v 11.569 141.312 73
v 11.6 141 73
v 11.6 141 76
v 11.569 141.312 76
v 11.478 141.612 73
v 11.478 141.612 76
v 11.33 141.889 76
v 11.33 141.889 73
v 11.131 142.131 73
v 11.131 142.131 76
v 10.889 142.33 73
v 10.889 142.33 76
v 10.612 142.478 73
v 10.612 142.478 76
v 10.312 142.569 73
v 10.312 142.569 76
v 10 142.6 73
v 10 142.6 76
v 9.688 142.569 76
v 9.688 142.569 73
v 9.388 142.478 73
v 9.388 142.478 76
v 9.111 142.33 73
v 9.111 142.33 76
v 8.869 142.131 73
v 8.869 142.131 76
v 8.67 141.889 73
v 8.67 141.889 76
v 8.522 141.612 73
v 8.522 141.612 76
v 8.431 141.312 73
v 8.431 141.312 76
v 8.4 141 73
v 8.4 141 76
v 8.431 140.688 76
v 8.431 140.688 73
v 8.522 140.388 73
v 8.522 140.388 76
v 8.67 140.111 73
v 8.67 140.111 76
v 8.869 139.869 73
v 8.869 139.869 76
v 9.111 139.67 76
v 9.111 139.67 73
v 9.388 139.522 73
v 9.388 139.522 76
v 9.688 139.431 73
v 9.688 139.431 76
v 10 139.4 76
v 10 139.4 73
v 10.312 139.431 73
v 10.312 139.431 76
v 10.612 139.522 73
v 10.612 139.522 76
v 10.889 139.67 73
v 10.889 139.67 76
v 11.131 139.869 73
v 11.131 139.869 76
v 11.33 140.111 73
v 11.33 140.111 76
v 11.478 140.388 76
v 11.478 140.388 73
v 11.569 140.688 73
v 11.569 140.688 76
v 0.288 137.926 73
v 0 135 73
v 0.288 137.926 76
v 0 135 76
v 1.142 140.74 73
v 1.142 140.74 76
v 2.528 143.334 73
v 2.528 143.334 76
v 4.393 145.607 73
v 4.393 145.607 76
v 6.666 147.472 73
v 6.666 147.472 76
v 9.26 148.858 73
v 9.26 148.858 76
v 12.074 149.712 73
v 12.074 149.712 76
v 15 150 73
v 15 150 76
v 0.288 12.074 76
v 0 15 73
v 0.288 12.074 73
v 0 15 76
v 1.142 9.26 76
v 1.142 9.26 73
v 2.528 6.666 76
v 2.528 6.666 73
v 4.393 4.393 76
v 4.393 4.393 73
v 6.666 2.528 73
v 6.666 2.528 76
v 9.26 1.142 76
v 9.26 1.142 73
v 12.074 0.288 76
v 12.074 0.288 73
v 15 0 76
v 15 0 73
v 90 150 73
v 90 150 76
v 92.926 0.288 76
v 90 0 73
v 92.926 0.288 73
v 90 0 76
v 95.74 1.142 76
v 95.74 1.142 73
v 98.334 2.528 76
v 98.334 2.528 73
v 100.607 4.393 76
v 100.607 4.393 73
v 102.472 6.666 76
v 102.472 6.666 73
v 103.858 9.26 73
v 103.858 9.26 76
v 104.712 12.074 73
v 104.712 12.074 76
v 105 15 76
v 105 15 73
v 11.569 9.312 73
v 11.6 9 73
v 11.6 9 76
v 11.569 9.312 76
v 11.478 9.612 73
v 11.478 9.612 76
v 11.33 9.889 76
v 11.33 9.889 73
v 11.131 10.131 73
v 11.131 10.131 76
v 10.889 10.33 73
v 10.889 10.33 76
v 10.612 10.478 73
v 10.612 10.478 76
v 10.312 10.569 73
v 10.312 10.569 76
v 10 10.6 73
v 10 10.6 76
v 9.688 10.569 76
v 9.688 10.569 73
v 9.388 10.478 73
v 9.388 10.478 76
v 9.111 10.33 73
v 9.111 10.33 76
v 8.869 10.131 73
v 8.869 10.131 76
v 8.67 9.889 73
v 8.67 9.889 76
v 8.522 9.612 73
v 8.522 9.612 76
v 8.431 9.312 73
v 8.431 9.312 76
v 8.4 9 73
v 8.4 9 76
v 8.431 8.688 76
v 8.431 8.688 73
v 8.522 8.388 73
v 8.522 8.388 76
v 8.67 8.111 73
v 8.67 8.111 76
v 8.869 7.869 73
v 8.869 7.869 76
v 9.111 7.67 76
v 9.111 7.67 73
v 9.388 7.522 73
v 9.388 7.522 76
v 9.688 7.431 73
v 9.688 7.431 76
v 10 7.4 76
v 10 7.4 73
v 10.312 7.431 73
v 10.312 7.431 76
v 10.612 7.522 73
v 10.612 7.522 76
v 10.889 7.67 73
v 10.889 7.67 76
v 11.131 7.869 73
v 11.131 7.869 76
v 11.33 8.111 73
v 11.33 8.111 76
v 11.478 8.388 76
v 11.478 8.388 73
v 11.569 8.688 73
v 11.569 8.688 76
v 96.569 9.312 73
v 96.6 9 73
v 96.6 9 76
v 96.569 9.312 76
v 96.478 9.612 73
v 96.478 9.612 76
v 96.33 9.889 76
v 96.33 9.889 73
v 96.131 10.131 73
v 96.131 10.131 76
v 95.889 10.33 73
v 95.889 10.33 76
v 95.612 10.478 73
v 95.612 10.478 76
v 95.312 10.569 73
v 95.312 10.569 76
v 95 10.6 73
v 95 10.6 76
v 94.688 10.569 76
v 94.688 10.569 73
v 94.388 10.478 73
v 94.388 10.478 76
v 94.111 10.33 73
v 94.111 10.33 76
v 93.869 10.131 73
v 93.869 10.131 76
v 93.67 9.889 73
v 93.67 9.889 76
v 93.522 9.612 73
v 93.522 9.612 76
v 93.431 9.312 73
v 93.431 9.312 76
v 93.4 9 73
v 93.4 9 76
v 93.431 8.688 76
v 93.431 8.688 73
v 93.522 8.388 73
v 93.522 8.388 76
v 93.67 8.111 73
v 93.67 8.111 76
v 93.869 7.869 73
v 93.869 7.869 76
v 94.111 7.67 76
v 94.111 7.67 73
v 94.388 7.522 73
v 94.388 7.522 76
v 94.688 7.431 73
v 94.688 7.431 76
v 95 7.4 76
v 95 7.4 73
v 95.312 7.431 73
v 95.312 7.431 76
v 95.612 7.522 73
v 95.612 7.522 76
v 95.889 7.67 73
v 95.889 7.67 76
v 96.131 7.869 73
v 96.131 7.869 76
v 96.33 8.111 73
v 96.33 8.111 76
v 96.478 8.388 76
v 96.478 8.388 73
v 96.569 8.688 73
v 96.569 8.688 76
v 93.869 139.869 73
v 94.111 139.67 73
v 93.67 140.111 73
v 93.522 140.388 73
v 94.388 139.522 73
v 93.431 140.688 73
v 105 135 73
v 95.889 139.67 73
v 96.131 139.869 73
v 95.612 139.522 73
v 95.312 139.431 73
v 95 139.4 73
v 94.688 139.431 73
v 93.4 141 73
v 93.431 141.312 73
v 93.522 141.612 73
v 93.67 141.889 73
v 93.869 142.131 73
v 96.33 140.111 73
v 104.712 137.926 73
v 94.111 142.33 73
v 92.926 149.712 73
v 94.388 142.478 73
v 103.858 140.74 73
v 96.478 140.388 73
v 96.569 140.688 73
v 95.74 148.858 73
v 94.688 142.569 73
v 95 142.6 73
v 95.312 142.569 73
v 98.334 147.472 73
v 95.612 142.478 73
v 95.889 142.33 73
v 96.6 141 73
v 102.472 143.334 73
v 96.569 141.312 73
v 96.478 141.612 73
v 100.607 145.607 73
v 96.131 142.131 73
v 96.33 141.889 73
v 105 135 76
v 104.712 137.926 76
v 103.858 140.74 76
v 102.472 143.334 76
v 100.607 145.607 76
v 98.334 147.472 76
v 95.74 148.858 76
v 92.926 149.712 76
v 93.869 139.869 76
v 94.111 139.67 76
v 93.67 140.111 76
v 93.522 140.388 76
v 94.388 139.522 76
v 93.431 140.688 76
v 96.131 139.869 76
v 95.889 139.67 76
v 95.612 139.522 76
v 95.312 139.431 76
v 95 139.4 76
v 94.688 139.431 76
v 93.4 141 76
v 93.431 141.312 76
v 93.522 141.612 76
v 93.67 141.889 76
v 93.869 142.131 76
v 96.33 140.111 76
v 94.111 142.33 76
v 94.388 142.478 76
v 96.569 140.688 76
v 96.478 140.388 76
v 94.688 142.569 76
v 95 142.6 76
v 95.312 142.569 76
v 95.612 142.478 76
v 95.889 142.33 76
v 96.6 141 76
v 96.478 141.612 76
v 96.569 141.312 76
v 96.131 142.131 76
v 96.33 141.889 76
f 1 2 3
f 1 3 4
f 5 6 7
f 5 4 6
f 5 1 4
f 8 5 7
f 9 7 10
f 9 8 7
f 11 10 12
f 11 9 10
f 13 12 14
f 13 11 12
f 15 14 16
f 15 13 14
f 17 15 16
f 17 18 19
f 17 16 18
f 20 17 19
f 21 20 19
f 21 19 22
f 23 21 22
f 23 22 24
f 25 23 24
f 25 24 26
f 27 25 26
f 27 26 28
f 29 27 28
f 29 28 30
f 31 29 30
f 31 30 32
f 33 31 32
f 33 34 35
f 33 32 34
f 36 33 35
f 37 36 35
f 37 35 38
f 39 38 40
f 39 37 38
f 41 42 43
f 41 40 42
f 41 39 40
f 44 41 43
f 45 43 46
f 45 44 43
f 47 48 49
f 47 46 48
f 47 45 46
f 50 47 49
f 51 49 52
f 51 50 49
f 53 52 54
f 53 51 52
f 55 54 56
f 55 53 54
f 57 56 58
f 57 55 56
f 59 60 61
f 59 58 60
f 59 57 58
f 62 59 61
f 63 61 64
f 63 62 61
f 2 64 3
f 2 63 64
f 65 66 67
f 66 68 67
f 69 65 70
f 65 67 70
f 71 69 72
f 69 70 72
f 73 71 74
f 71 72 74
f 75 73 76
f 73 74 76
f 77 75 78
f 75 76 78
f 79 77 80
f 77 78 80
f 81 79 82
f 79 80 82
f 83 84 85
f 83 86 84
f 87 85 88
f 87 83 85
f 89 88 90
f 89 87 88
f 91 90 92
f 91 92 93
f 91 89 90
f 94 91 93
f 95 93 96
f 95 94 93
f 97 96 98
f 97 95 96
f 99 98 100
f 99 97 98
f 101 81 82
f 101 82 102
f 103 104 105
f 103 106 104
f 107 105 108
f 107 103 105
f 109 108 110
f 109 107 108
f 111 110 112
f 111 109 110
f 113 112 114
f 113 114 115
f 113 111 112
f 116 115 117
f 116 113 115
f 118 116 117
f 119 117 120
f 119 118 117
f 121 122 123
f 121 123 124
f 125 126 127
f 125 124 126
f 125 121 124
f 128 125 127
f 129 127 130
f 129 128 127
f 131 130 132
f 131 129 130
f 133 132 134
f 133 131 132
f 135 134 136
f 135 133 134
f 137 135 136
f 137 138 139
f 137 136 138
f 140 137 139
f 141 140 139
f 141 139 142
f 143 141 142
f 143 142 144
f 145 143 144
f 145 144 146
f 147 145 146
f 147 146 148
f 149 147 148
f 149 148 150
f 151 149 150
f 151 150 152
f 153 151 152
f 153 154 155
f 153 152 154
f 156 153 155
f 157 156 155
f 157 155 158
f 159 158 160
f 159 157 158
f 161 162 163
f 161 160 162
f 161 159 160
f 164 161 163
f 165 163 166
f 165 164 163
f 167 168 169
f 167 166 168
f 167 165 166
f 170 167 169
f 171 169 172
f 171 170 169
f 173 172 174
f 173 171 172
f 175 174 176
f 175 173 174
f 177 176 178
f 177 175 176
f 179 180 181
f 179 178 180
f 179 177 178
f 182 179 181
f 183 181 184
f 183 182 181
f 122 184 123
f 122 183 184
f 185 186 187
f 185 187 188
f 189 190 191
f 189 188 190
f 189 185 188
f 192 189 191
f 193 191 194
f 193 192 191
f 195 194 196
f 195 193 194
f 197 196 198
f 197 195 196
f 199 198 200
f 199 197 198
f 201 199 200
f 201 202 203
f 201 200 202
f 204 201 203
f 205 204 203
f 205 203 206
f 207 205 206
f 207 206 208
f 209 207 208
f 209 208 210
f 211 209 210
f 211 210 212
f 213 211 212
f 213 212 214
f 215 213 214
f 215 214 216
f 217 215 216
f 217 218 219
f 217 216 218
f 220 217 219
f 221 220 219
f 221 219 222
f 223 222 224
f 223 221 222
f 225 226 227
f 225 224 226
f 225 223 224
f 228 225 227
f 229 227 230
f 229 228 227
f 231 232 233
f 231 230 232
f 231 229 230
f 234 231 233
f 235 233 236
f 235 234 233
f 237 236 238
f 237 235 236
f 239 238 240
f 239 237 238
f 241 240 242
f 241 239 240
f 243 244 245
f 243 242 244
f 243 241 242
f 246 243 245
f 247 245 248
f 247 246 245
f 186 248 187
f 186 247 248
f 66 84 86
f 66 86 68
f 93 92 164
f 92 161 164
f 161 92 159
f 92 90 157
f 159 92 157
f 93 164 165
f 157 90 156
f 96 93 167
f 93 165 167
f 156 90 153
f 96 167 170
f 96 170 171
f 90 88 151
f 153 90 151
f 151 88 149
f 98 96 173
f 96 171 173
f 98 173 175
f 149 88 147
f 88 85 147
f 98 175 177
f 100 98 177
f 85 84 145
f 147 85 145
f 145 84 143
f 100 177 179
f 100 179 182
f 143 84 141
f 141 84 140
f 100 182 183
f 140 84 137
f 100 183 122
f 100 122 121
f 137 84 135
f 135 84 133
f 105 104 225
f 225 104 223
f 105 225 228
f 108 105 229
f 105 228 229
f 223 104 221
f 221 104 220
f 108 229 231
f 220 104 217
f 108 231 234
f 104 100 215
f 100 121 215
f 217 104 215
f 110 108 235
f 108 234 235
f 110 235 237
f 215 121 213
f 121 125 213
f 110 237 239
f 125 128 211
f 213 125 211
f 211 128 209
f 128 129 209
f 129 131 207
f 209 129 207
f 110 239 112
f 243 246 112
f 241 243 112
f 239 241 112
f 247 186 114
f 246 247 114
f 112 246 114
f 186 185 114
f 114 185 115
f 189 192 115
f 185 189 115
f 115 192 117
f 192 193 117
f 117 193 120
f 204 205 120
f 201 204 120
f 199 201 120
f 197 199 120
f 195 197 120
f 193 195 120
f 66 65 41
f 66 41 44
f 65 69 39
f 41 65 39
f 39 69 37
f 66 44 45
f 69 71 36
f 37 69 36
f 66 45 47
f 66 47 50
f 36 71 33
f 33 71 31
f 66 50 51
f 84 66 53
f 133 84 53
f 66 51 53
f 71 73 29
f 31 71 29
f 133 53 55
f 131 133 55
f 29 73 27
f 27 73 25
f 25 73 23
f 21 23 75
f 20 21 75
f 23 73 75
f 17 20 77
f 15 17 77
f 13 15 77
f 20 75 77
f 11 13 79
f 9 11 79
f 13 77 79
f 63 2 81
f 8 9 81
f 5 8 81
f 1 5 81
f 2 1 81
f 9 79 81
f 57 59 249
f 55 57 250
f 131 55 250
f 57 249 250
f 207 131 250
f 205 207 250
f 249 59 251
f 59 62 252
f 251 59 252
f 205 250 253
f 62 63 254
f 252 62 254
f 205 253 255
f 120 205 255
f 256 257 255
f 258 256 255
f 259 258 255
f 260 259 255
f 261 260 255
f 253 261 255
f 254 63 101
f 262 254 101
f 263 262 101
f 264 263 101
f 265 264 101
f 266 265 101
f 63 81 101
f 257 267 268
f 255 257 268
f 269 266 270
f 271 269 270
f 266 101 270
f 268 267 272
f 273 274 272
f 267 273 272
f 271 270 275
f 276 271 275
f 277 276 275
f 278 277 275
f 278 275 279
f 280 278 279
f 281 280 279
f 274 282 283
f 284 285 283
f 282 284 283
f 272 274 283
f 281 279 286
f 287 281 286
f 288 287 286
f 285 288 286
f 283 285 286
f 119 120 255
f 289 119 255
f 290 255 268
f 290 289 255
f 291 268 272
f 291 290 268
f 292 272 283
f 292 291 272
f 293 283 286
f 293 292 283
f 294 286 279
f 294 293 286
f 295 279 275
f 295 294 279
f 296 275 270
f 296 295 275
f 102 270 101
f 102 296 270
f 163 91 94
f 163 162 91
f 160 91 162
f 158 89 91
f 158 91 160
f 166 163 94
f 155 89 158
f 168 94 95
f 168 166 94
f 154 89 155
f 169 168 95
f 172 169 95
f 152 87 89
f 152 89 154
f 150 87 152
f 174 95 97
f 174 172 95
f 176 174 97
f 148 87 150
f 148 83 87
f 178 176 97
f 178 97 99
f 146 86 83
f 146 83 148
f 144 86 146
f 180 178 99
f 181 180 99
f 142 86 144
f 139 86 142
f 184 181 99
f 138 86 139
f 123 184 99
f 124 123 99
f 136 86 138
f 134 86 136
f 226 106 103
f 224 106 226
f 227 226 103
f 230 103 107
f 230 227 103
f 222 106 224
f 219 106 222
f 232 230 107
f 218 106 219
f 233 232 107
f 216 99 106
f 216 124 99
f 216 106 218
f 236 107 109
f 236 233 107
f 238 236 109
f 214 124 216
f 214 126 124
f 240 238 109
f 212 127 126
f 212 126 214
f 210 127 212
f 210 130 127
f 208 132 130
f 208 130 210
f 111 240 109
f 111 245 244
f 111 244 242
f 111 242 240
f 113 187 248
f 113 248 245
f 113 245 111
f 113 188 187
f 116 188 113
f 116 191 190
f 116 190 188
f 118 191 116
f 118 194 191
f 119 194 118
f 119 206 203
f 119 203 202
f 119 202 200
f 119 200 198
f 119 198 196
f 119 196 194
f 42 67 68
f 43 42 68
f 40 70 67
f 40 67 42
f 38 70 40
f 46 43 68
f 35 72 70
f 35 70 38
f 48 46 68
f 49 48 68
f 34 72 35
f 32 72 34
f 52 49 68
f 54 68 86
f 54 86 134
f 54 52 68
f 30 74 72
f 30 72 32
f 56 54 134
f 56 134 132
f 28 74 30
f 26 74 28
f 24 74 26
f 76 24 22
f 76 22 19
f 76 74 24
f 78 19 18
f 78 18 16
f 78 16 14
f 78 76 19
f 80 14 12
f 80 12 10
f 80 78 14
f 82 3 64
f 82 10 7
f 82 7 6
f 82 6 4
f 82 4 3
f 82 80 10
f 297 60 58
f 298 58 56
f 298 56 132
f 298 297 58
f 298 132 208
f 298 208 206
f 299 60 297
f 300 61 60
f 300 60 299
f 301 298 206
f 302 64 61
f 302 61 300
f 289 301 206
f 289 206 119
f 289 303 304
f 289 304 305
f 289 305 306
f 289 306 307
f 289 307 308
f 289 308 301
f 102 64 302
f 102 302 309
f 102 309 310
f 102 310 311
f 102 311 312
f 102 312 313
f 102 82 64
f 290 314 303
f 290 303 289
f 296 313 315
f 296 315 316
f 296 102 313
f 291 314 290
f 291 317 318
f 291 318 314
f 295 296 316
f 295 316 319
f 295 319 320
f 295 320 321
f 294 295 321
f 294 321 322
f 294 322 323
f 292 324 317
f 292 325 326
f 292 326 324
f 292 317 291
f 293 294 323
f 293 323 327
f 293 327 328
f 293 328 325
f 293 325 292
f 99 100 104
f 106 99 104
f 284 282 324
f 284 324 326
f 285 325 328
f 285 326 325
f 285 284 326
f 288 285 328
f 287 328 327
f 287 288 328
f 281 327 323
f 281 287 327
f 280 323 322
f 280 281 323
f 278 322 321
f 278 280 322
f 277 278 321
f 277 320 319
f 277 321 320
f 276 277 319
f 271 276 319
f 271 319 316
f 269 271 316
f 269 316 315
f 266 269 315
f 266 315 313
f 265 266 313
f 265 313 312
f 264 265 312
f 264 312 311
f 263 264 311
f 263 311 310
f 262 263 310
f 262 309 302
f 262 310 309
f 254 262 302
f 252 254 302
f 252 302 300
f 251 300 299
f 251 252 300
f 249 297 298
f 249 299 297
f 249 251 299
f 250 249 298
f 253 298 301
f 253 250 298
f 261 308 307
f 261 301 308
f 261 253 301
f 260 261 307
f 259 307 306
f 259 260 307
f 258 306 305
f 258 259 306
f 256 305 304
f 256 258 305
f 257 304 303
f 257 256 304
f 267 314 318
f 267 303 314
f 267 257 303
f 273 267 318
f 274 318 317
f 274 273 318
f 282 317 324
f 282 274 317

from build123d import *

# Parameters (mm, degrees)
CYLINDER015_R     = 1.6
CYLINDER015_DEPTH = 22
CYLINDER016_R     = 1.6
CYLINDER016_DEPTH = 22
CYLINDER013_R     = 1.6
CYLINDER013_DEPTH = 22
CYLINDER014_R     = 1.6
CYLINDER014_DEPTH = 22
BOX006_W          = 105
BOX006_H          = 150
BOX006_DEPTH      = 3
FILLET004_R       = 15


with BuildPart() as cilindro015:
    # Cylinder015 → Cylinder015 (new body)
    with BuildSketch(Plane(origin=(10, 141, 51), x_dir=(1, 0, 0), z_dir=(0, 0, 1))):
        Circle(CYLINDER015_R)
    extrude(amount=CYLINDER015_DEPTH)


with BuildPart() as cilindro016:
    # Cylinder016 → Cylinder016 (new body)
    with BuildSketch(Plane(origin=(95, 141, 51), x_dir=(1, 0, 0), z_dir=(0, 0, 1))):
        Circle(CYLINDER016_R)
    extrude(amount=CYLINDER016_DEPTH)


with BuildPart() as cilindro013:
    # Cylinder013 → Cylinder013 (new body)
    with BuildSketch(Plane(origin=(95, 9, 51), x_dir=(1, 0, 0), z_dir=(0, 0, 1))):
        Circle(CYLINDER013_R)
    extrude(amount=CYLINDER013_DEPTH)


with BuildPart() as fusion006:
    # Cylinder014 → Cylinder014 (new body)
    with BuildSketch(Plane(origin=(10, 9, 51), x_dir=(1, 0, 0), z_dir=(0, 0, 1))):
        Circle(CYLINDER014_R)
    extrude(amount=CYLINDER014_DEPTH)

    # Fusion006: union Cilindro015, Cilindro016, Cilindro013
    add(cilindro015.part)
    add(cilindro016.part)
    add(cilindro013.part)


with BuildPart() as fusion006_1:
    # Fusion006 placement: moved
    add(fusion006.part.moved(Location((0, 0, 7))))


with BuildPart() as cut008:
    # Box006 → Box006 (new body)
    with BuildSketch(Plane.XY):
        with Locations((52.5, 75)):
            Rectangle(BOX006_W, BOX006_H)
    extrude(amount=BOX006_DEPTH)

    # Fillet004
    fillet004_edges = [cut008.edges().sort_by_distance(p)[0] for p in [
        (0, 0, 1.5),
        (0, 150, 1.5),
        (105, 0, 1.5),
        (105, 150, 1.5),
    ]]
    fillet(fillet004_edges, radius=FILLET004_R)


with BuildPart() as cut008_1:
    # Fillet004 placement: moved
    add(cut008.part.moved(Location((0, 0, 72))))

    # Cut008: cut Fusion006
    add(fusion006_1.part, mode=Mode.SUBTRACT)


with BuildPart() as cut008_2:
    # Cut008 placement: moved
    add(cut008_1.part.moved(Location((0, 0, 1))))


solid = cut008_2.part
